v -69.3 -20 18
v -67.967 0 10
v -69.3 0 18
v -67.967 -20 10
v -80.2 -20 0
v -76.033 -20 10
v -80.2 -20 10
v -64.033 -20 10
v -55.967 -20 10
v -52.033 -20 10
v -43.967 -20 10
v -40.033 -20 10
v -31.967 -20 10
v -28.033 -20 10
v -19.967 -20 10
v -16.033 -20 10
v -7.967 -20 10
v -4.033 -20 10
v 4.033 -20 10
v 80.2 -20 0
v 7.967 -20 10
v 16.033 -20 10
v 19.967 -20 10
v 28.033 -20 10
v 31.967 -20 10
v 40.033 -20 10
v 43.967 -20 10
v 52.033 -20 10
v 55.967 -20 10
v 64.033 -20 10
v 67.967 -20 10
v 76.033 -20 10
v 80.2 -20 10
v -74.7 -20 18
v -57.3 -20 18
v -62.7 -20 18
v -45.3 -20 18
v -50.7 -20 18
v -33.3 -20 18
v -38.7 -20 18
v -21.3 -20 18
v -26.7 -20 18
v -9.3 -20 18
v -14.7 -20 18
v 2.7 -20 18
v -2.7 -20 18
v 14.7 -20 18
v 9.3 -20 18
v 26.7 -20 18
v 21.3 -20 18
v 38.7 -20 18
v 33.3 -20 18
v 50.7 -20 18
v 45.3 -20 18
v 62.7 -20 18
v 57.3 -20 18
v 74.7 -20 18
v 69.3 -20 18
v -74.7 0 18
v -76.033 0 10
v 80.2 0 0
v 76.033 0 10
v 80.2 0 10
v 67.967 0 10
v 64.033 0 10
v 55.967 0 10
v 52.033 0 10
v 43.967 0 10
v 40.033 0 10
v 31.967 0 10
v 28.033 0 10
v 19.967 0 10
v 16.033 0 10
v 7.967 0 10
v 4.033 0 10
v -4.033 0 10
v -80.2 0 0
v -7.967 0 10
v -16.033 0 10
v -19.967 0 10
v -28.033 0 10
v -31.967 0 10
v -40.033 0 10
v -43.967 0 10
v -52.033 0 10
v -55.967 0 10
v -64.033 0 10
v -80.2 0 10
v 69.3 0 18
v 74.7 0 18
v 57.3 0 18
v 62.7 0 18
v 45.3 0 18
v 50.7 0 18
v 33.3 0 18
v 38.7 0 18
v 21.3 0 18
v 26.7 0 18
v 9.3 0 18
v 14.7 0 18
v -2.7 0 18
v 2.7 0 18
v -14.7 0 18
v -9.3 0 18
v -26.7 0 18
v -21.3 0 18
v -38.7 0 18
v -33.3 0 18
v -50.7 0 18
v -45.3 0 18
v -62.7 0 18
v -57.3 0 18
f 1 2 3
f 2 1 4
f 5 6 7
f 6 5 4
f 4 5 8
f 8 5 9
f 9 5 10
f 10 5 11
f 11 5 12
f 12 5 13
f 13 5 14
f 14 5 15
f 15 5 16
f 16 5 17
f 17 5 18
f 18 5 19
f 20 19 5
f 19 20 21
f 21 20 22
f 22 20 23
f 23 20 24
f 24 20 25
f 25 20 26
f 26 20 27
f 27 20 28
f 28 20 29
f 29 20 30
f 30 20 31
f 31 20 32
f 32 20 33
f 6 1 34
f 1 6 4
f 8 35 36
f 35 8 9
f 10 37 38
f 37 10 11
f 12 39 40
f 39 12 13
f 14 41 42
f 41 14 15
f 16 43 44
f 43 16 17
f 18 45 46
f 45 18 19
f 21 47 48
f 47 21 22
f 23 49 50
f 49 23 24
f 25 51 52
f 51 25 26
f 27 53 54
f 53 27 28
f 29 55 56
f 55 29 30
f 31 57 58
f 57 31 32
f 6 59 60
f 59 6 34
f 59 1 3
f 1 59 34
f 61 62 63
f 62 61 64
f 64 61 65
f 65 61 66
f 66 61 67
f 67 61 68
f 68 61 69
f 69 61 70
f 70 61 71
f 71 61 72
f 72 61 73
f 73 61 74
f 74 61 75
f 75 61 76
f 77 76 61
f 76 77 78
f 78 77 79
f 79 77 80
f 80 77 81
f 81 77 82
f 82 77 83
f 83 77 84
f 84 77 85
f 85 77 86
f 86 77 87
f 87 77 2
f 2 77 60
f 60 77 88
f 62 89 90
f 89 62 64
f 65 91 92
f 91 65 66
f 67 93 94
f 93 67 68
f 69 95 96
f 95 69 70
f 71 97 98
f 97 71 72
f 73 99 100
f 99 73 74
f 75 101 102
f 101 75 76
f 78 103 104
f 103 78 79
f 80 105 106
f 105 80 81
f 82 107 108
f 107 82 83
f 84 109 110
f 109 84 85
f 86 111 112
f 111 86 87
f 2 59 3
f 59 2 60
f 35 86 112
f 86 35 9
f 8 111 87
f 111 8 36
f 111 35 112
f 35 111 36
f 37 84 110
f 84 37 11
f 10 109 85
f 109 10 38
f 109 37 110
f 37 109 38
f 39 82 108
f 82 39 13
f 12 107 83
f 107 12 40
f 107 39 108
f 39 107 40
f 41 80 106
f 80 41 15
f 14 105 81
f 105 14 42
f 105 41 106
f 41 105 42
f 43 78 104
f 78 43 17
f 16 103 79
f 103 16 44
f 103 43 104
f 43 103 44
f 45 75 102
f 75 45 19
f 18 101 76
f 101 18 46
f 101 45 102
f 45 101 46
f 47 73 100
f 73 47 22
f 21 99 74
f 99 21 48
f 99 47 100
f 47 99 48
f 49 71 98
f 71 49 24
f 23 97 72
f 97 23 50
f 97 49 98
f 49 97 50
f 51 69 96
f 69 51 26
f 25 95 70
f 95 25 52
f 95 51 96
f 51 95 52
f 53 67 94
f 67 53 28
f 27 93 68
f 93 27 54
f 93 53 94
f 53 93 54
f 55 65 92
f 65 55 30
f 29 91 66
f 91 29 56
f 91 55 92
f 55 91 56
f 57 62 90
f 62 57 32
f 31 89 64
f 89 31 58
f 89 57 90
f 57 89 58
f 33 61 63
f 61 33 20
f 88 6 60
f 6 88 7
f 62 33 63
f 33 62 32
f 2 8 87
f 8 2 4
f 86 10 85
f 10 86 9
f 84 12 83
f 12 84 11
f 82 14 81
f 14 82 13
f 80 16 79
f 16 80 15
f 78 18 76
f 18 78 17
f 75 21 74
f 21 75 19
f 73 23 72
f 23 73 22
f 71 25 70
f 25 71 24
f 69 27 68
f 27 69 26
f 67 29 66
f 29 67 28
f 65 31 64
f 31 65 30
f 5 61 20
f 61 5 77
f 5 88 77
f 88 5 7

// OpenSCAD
$fn = 32;

// ----------------------------------------------------------------------
// Toothed rack, 13 teeth
// 12 mm pitch, 8 mm teeth
// ----------------------------------------------------------------------

// --- parameters (mm) ---
bar_w = 20;     // bar width (Y)
bar_h = 10;     // bar height (Z)
teeth = 13;     // number of teeth
pitch = 12;     // tooth pitch
tooth_h = 8;    // tooth height above the bar
root_w = 8.4;   // tooth width at the root
crest_w = 5.4;  // tooth width at the crest

// --- derived feature positions (mm) ---
span = (teeth - 1) * pitch;  // = 144   distance between the outer teeth
bar_l = span + root_w + 8;   // = 160.4   bar length: teeth plus 4 mm at each end
tooth_x = -span / 2;         // = -72   X of the first tooth
height = bar_h + tooth_h;    // = 18   overall height
feature_centers = [
  [tooth_x + 0 * pitch, -bar_w / 2],
  [tooth_x + 1 * pitch, -bar_w / 2],
  [tooth_x + 2 * pitch, -bar_w / 2],
  [tooth_x + 3 * pitch, -bar_w / 2],
  [tooth_x + 4 * pitch, -bar_w / 2],
  [tooth_x + 5 * pitch, -bar_w / 2],
  [tooth_x + 6 * pitch, -bar_w / 2],
  [tooth_x + 7 * pitch, -bar_w / 2],
  [tooth_x + 8 * pitch, -bar_w / 2],
  [tooth_x + 9 * pitch, -bar_w / 2],
  [tooth_x + 10 * pitch, -bar_w / 2],
  [tooth_x + 11 * pitch, -bar_w / 2],
  [tooth_x + 12 * pitch, -bar_w / 2]
];   // tooth centre line, drives the tooth loop

// bar with a rack of teeth, one extruded trapezoium per centre
module rack_tooth() {
  linear_extrude(height = bar_w)
    polygon(points = [
      [0, 0],
      [root_w, 0],
      [root_w / 2 + crest_w / 2, tooth_h + 1],
      [root_w / 2 - crest_w / 2, tooth_h + 1]
    ]);
}

union() {
  translate([-bar_l / 2, -bar_w, 0]) cube([bar_l, bar_w, bar_h]);
  for (centre = feature_centers)
    translate([centre[0] - root_w / 2, 0, bar_h - 1]) rotate([90, 0, 0]) rack_tooth();
}
